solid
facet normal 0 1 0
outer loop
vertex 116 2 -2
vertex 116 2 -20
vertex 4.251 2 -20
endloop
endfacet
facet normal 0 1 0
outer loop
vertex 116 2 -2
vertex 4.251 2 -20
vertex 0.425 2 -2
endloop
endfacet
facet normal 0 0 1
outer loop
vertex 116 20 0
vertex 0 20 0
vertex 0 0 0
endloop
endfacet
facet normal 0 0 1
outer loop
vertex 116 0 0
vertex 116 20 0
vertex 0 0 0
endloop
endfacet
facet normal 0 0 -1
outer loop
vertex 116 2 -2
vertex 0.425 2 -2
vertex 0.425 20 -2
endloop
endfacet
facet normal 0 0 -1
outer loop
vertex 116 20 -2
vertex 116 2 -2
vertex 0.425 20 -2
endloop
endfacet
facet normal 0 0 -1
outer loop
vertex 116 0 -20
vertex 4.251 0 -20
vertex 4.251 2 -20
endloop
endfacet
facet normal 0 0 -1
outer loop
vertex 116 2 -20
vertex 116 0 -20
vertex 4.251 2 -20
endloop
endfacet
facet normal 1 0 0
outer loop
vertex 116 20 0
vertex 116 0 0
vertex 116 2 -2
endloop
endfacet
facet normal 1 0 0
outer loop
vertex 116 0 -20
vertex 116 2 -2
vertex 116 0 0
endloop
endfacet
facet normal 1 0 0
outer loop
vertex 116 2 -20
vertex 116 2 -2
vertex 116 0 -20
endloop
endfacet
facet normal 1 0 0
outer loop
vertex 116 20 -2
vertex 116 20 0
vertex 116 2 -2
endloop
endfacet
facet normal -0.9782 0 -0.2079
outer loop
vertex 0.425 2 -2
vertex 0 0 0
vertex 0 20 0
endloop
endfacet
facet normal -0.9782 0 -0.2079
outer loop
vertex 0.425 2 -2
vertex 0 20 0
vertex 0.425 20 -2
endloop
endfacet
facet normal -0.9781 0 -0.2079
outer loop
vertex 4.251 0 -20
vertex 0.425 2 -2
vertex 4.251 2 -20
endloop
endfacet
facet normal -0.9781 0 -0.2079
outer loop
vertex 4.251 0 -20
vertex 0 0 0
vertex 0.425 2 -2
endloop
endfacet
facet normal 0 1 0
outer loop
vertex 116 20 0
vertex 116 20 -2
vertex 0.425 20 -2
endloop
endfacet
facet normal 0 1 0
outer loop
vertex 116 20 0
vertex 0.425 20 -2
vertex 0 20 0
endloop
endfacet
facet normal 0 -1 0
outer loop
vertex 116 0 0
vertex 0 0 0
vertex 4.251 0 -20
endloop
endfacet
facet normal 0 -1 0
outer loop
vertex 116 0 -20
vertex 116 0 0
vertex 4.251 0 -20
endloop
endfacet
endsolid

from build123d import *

# Parameters (mm, degrees)
BOSS_EXTRUDE1_DEPTH = 116
CUT_EXTRUDE1_DEPTH  = 120.398492453


with BuildPart() as part:
    # Sketch1 → Boss-Extrude1 (new body)
    with BuildSketch(Plane(origin=(0, 0, 0), x_dir=(0, 0, -1), z_dir=(1, 0, 0))):
        Polygon((0, 20), (0, 0), (20, 0), (20, 2), (2, 2), (2, 20), align=None)
    extrude(amount=BOSS_EXTRUDE1_DEPTH)

    # Sketch2 → Cut-Extrude1 (cut, through all)
    with BuildSketch(Plane.XZ):
        Polygon((0, 0), (4.251131233, -20), (0, -20), align=None)
    extrude(amount=-CUT_EXTRUDE1_DEPTH, mode=Mode.SUBTRACT)


solid = part.part
